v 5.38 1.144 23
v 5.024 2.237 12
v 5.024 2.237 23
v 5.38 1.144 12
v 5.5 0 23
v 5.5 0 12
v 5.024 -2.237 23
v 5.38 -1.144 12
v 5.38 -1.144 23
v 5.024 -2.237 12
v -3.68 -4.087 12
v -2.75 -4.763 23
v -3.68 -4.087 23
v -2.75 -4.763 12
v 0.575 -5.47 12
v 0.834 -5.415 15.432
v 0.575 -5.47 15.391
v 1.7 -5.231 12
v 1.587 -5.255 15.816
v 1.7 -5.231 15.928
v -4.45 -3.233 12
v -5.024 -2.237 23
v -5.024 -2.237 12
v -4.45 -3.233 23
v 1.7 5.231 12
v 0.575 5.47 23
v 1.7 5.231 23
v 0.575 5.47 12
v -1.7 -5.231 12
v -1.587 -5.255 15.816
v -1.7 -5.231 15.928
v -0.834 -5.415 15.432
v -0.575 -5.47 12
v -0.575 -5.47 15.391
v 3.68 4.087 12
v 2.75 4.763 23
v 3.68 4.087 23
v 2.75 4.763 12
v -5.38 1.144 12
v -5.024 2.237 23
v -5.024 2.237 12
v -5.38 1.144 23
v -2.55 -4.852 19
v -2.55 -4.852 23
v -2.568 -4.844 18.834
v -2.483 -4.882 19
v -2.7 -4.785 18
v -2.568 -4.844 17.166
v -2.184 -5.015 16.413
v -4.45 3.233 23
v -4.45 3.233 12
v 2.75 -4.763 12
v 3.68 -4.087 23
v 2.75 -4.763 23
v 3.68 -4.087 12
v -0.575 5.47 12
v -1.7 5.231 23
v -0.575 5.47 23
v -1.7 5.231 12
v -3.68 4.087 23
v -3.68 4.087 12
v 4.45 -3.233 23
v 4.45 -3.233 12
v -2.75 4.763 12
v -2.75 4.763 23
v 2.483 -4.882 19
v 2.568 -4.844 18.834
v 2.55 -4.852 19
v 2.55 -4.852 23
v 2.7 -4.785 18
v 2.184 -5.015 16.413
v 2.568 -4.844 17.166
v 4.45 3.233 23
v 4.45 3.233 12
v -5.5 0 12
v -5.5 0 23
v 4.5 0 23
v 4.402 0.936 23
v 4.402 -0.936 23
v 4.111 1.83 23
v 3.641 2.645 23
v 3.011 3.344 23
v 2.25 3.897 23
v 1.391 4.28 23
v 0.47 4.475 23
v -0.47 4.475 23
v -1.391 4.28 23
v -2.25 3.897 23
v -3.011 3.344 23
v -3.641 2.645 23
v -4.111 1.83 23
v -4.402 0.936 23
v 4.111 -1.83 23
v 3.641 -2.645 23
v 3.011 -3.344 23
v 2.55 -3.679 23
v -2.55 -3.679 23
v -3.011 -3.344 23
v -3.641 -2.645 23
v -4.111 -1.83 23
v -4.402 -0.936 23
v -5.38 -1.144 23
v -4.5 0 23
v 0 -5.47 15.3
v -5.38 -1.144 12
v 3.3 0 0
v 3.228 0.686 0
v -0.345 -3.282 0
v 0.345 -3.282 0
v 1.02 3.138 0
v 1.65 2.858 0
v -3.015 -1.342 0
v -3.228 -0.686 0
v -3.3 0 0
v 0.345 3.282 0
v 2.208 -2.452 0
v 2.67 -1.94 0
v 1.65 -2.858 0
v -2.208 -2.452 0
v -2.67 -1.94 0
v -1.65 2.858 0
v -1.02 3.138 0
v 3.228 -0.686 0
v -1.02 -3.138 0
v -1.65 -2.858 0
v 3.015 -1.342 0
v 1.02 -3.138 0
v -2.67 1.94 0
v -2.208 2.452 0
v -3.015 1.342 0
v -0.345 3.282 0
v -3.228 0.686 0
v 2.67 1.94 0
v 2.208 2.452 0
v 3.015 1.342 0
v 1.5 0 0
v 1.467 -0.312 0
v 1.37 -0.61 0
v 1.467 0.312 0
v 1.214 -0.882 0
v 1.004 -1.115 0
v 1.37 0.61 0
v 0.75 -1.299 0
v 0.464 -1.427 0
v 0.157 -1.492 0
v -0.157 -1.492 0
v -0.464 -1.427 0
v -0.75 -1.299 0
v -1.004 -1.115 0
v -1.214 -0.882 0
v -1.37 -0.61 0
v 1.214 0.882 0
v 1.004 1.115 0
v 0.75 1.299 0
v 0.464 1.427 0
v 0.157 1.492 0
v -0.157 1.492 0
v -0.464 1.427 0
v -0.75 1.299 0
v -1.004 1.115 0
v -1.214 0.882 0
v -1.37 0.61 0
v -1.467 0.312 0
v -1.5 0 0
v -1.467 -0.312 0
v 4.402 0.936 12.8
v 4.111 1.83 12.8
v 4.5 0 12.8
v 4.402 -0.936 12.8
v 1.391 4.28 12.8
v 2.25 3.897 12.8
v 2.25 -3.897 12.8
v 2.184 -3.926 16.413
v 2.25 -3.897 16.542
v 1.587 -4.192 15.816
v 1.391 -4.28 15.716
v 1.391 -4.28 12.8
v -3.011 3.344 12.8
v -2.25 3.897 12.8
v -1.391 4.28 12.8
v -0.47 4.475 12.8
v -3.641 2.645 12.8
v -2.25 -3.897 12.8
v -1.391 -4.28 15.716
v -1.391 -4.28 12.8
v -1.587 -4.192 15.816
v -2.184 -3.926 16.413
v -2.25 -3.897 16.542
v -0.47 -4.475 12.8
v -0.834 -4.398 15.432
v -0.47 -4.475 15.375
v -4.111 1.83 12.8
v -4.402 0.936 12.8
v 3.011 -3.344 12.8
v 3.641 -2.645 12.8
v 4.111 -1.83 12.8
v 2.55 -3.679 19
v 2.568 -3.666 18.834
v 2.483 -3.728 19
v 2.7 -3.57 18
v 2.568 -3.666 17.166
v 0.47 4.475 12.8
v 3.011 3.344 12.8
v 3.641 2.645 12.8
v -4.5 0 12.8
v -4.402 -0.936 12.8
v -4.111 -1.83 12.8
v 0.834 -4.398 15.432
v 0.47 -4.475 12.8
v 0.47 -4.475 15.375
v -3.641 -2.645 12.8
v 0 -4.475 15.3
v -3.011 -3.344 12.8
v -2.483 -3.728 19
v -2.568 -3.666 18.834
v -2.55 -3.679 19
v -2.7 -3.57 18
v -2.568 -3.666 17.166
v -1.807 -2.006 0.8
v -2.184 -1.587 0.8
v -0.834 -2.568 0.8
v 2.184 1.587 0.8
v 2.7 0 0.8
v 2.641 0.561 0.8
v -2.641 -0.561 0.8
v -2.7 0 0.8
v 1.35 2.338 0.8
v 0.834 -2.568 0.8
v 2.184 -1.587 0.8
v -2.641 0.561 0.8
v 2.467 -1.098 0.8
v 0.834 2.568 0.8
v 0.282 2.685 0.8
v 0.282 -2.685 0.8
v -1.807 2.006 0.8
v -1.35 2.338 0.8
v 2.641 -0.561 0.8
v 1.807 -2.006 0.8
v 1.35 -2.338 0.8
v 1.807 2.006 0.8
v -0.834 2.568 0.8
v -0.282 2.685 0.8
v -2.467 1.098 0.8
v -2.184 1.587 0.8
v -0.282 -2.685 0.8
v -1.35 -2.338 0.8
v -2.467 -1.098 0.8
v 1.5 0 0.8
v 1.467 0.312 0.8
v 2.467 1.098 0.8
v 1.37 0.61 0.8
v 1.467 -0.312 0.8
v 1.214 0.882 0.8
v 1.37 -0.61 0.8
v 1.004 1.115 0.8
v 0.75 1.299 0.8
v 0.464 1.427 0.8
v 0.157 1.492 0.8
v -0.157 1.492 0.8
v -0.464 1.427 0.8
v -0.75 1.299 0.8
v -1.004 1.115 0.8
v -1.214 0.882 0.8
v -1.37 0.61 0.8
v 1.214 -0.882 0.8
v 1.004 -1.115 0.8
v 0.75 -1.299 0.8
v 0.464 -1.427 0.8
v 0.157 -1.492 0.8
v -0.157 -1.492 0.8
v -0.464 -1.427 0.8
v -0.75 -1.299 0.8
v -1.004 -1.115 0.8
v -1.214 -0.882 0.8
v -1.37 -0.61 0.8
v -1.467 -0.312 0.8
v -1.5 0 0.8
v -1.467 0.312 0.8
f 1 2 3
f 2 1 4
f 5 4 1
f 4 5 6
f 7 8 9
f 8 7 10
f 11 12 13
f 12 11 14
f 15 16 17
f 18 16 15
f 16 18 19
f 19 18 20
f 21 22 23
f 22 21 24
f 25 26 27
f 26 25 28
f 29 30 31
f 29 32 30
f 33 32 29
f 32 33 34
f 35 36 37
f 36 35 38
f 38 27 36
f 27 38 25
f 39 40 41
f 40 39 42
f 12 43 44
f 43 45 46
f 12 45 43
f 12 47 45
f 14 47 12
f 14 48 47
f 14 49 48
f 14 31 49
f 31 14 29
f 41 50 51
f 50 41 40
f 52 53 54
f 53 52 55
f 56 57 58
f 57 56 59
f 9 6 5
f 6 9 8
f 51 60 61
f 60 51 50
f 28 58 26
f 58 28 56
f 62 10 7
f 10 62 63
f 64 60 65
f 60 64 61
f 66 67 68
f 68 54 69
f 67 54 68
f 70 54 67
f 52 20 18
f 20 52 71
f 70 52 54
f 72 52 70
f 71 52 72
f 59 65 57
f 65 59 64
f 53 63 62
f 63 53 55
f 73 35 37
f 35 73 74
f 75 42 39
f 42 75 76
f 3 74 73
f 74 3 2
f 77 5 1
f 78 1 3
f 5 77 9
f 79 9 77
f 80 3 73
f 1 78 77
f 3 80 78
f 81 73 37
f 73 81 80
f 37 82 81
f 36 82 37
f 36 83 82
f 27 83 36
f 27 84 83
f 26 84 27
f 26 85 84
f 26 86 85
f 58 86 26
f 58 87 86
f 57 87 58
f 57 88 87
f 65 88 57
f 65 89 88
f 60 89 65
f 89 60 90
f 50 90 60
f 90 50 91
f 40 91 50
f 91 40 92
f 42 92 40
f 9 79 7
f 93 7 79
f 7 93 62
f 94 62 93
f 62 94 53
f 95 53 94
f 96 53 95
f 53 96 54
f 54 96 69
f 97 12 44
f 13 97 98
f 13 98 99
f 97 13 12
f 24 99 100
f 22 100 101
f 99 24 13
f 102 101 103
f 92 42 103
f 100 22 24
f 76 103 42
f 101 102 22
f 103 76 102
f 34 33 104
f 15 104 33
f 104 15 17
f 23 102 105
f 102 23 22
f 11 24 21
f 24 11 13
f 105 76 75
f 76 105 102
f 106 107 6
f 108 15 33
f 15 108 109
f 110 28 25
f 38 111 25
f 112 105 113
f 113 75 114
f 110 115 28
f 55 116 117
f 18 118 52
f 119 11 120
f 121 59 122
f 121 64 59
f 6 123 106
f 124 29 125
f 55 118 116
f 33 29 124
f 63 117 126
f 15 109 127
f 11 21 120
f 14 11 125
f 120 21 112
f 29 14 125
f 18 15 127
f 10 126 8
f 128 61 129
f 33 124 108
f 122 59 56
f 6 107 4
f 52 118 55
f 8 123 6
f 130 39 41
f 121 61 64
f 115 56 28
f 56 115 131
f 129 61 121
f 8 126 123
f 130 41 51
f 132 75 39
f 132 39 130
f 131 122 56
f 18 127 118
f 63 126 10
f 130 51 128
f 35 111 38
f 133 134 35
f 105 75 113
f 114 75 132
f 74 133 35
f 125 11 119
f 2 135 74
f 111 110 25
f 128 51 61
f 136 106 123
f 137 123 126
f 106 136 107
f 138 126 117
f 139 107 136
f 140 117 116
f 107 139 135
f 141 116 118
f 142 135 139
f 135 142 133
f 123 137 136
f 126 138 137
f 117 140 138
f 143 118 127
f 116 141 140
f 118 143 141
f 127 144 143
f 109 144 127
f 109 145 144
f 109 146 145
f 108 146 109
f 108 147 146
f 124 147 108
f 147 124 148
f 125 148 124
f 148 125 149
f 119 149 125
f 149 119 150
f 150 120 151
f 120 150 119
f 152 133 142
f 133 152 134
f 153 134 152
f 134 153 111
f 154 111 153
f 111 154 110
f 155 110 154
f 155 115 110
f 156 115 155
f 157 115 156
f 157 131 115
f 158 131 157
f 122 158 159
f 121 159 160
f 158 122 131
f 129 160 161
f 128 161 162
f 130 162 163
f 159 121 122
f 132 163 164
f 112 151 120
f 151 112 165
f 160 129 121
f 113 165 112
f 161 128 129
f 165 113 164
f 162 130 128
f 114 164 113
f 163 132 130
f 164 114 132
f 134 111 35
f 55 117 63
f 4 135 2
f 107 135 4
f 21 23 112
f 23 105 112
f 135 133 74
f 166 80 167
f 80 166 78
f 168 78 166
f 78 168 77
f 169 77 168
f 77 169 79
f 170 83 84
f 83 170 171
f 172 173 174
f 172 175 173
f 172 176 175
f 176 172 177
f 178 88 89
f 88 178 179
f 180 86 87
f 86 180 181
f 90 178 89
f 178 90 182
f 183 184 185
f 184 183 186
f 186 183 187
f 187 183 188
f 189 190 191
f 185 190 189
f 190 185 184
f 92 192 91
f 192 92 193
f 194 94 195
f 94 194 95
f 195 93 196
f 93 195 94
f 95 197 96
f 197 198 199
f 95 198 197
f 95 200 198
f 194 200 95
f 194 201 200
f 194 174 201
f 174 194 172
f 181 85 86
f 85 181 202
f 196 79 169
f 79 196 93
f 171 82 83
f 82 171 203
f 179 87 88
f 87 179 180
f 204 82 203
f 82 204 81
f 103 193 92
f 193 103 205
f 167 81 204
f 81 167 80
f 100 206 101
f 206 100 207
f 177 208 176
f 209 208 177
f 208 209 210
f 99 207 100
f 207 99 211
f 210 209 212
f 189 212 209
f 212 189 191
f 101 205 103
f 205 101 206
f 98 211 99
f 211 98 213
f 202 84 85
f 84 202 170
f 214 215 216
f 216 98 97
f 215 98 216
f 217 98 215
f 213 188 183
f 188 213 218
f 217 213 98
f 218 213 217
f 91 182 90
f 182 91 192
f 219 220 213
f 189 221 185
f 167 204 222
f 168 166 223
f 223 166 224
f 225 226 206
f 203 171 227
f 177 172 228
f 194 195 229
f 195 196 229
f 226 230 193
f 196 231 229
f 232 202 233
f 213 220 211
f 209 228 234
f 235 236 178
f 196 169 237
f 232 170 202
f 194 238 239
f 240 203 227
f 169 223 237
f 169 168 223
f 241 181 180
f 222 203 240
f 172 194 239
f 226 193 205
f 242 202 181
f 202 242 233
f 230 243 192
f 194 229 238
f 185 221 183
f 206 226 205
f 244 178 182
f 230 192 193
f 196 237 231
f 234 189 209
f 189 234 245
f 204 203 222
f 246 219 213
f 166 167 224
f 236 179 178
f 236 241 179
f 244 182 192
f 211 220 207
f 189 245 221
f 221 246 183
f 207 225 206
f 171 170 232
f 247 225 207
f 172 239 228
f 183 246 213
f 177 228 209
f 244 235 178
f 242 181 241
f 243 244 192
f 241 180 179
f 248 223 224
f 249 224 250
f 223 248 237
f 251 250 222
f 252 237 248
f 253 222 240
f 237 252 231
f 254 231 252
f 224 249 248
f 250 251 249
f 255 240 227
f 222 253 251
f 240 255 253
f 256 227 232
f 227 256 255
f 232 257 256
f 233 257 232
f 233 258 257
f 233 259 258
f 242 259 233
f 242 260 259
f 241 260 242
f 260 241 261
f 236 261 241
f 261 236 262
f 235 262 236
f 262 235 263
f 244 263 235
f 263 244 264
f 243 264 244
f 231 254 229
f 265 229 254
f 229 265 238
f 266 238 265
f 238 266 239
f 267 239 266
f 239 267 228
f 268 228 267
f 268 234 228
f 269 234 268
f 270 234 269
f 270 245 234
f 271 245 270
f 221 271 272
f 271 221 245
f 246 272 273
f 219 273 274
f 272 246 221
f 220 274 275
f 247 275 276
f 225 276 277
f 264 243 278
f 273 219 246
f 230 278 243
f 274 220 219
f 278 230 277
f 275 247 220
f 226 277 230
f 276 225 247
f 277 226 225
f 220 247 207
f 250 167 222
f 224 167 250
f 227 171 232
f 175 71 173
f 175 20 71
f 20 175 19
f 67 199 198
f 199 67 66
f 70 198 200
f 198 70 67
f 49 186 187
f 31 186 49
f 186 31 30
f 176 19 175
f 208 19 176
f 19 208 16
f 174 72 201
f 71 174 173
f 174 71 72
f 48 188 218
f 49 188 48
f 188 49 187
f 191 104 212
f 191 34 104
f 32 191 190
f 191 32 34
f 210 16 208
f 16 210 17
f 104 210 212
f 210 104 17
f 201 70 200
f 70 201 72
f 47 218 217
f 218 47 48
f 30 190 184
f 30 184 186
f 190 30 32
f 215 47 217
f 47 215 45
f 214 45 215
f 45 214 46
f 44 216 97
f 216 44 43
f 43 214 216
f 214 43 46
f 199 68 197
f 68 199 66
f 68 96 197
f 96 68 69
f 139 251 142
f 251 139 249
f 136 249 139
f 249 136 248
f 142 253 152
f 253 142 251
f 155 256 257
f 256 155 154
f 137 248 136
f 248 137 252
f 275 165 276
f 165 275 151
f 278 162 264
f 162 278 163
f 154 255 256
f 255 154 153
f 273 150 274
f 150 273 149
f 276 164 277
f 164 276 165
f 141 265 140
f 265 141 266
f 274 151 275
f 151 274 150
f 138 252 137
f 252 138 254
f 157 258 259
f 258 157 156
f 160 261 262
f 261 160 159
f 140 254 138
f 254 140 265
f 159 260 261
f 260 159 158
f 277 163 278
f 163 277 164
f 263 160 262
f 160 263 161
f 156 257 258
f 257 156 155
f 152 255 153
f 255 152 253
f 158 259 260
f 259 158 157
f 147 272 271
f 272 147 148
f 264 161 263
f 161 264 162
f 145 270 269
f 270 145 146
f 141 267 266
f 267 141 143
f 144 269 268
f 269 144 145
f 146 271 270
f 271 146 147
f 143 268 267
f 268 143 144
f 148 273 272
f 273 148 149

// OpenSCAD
d=8.2+.8;

d2=5.4;

r_in = d/2;
r_out = d/2 + 1;
difference() {
  union() {
    translate([0, 0, 12])
      cylinder(h=11, r1=r_out, r2=r_out, $fn=30);
    cylinder(h=12, r1=r_out*.6, r2=r_out, $fn=30);
  }
  union() {
    translate([0, 0, 0.8])
//      cylinder(h=24, r1=r_in, r2=r_in, $fn=30); 
    union() {
      translate([0, 0, 12])
        cylinder(h=11, r1=r_in, r2=r_in, $fn=30);
      cylinder(h=12, r1=r_in*.6, r2=r_in, $fn=30);
    }
    translate([0, 0, 24-5-1])
      rotate([90, 0, 0])
        cylinder(h=10, r1=d2/2, r2=d2/2, $fn=20);
    translate([0, -12, 24])
      rotate([90, 0, 0])
        cube([d2-0.3, 10, 20], center=true);
    translate([0, 0, -1])
      cylinder(h=5, r1=1.5, r2=1.5, $fn=30); 
  }
}
